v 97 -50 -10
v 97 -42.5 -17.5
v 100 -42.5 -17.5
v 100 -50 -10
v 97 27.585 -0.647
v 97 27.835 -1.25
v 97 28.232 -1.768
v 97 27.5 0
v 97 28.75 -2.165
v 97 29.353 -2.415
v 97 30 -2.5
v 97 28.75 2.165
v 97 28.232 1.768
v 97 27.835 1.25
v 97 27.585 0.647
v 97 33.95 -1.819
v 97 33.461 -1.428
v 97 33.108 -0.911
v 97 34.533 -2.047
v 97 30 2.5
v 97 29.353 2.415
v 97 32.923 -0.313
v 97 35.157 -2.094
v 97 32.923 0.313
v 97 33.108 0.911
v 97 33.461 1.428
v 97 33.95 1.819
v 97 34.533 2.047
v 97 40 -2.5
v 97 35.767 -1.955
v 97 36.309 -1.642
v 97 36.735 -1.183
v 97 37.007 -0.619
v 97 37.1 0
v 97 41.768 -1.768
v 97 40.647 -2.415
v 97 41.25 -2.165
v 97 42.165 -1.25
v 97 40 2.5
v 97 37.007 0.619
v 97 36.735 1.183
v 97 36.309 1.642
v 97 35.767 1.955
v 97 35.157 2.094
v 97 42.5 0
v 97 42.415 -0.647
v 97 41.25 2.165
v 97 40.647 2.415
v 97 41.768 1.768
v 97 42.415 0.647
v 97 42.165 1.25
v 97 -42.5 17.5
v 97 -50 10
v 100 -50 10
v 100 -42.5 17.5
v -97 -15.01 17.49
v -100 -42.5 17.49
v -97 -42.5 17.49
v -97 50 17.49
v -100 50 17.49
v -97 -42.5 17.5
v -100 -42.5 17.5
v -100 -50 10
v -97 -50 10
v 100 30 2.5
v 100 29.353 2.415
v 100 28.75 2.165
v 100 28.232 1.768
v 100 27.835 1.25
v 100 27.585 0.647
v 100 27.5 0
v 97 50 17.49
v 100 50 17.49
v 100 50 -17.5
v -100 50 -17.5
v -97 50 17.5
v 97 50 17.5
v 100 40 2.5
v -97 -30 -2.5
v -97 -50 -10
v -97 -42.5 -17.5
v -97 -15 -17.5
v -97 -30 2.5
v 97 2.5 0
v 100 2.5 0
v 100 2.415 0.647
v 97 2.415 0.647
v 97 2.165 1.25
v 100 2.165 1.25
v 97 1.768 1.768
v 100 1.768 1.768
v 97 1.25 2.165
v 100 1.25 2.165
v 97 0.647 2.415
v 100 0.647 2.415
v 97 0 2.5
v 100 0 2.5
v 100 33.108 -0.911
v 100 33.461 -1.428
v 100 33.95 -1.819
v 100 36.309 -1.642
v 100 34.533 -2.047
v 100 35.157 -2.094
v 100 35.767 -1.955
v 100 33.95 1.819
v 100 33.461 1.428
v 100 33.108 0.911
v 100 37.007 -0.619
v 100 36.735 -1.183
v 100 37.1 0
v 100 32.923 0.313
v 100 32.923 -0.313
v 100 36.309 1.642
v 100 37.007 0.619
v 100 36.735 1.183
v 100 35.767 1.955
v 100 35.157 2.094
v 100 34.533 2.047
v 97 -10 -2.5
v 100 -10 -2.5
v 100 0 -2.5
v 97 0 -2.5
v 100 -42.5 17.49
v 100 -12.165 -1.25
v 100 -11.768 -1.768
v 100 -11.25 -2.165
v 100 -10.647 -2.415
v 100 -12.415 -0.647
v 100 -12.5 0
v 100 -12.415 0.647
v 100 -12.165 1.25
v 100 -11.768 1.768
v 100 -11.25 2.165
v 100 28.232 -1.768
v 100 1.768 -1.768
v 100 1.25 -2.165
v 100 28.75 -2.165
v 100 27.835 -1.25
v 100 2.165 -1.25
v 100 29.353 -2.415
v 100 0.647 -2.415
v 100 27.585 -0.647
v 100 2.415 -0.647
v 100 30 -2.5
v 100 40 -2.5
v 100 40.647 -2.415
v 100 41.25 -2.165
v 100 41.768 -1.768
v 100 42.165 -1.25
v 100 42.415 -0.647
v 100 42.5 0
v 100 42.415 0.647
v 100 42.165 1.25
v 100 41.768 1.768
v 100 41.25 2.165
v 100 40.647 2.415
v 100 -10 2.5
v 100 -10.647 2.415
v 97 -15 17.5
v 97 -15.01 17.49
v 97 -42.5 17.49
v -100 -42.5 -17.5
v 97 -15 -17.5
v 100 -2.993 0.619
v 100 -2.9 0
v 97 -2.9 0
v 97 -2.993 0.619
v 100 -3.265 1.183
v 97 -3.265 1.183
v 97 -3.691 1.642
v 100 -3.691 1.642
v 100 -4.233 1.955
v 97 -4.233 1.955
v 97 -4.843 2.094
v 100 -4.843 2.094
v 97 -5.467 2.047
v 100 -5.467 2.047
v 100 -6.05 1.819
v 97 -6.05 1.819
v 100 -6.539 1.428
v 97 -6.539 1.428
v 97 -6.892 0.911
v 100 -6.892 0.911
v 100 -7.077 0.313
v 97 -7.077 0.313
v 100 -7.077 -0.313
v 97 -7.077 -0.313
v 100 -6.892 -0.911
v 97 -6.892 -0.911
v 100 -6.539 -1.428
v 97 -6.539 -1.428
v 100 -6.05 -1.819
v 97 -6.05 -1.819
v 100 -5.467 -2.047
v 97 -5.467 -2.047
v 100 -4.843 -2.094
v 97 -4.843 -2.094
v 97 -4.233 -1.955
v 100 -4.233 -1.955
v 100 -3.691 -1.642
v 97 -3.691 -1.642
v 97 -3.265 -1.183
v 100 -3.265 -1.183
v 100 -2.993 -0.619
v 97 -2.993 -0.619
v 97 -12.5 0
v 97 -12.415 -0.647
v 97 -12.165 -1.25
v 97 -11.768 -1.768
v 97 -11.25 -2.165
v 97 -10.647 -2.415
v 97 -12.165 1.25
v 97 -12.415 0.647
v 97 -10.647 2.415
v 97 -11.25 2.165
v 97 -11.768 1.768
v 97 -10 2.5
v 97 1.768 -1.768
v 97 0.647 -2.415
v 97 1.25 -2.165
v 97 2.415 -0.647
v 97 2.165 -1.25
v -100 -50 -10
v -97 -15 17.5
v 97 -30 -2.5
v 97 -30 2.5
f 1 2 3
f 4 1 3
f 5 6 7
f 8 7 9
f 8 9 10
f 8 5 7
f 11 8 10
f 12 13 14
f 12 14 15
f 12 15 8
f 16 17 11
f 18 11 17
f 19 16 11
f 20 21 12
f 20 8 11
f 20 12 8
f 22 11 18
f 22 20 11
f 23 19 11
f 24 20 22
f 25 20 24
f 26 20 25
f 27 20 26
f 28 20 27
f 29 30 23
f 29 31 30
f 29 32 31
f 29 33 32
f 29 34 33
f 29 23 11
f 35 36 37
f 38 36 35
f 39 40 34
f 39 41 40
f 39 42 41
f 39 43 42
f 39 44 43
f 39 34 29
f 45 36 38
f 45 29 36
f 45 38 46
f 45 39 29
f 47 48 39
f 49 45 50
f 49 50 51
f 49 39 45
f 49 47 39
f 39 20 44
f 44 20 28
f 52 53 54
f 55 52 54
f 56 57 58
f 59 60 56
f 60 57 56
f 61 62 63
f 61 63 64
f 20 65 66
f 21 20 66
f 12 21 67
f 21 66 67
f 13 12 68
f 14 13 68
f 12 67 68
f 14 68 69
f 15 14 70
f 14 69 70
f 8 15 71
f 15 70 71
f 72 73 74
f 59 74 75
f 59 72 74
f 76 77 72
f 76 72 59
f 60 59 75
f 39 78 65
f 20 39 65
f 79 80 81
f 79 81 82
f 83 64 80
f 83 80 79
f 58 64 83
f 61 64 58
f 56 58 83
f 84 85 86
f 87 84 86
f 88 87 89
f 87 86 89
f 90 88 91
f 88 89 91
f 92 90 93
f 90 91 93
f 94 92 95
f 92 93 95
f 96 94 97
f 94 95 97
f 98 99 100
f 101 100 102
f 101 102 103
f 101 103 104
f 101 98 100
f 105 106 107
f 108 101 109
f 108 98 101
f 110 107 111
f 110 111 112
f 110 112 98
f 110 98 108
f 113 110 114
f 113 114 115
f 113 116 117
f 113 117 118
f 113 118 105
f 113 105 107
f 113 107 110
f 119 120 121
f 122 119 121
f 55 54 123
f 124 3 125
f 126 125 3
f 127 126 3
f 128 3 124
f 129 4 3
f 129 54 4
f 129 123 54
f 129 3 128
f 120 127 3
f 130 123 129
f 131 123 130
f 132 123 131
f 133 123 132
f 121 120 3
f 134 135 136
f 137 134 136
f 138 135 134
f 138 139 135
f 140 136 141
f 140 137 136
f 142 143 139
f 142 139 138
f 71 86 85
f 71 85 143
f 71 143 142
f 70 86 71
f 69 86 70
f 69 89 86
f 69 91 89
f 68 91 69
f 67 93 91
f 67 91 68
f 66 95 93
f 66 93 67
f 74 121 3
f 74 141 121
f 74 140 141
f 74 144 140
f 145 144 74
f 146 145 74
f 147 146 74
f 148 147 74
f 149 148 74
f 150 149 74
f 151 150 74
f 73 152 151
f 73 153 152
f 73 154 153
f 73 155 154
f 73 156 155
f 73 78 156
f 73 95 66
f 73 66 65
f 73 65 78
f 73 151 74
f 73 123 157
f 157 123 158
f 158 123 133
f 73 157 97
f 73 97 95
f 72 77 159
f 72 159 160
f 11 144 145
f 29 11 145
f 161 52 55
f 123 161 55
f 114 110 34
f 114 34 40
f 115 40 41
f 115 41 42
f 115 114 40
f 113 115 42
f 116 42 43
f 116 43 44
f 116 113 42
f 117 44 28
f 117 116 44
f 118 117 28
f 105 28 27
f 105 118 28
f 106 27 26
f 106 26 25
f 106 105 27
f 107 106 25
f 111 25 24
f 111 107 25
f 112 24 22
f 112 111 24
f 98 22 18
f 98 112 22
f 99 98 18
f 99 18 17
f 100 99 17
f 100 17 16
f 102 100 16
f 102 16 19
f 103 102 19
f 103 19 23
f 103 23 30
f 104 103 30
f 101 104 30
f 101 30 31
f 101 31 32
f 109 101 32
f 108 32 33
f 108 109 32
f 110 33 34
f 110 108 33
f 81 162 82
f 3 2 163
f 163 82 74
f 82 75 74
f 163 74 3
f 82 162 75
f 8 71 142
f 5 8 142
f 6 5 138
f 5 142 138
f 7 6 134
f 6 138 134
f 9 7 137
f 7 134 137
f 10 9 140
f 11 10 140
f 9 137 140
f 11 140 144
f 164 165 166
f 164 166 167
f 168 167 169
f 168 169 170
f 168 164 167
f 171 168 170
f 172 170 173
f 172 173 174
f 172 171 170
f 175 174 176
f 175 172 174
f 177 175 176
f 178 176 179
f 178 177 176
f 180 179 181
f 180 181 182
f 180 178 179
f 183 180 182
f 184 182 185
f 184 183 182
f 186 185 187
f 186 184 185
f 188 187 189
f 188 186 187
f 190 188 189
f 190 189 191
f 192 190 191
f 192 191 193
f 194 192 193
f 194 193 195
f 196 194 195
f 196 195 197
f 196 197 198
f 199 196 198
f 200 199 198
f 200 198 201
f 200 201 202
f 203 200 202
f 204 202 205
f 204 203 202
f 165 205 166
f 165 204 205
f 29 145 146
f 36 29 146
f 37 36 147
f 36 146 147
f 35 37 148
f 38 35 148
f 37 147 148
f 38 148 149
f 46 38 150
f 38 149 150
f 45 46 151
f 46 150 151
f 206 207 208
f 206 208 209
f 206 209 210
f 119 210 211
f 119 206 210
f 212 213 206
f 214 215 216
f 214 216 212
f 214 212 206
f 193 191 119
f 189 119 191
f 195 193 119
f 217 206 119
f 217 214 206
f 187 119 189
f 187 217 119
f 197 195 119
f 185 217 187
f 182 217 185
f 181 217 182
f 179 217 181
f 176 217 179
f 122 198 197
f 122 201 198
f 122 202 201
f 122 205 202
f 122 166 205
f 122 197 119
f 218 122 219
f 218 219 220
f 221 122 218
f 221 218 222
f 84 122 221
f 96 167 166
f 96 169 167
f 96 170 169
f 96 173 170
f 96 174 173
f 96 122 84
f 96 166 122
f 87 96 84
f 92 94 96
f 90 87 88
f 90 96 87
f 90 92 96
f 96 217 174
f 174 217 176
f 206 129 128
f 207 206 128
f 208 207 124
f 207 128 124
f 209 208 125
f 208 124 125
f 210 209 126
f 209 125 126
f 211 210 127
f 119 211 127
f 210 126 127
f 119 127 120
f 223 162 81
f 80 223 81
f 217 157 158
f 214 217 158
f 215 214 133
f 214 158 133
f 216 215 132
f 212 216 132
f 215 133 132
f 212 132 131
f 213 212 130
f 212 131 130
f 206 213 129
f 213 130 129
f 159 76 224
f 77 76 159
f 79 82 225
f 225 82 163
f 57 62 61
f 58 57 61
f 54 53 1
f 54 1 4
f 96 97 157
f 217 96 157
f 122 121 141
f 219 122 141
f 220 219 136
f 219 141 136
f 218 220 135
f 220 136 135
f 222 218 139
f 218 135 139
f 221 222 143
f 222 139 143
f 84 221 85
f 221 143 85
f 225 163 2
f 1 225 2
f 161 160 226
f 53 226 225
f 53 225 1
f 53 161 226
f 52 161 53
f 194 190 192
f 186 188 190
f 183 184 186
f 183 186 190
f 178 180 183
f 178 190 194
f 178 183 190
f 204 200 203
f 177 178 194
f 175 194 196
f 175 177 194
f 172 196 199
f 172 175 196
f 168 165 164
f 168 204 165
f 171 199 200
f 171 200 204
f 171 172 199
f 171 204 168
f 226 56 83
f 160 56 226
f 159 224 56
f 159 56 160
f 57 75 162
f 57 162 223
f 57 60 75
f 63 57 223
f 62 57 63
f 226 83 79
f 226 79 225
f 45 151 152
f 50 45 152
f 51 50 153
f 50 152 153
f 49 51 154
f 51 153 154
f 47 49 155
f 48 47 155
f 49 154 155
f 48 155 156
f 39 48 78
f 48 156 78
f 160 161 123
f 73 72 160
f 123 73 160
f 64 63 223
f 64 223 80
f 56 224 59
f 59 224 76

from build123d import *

# Parameters (mm, degrees)
F1_DEPTH      = 17.5
F1_DEPTH_BACK = 17.5
F2_SIZE       = 15
F3_SIZE       = 7.5
F4_R          = 2.1
F5_DEPTH      = 3
F7_DEPTH      = 0.01


with BuildPart() as f1:
    # F0 (on Top) → F1 (new body, two sides)
    with BuildSketch(Plane.XY) as f1_sk:
        Polygon((100, -50), (100, 50), (-100, 50), (-100, -50), (-97, -50), (-97, -30), (97, -30), (97, -50), align=None)
    extrude(amount=F1_DEPTH)
    extrude(f1_sk.sketch, amount=-F1_DEPTH_BACK)

    # F2
    f2_edges = [f1.edges().sort_by_distance(p)[0] for p in [
        (0, -30, 17.5),
        (0, -30, -17.5),
    ]]
    chamfer(f2_edges, length=F2_SIZE)

    # F3
    f3_edges = [f1.edges().sort_by_distance(p)[0] for p in [
        (98.5, -50, 17.5),
        (98.5, -50, -17.5),
        (-98.5, -50, 17.5),
        (-98.5, -50, -17.5),
    ]]
    chamfer(f3_edges, length=F3_SIZE)

    # F4 (on face) → F5 (cut)
    with BuildSketch(Plane.YZ.offset(100)):
        with BuildLine():
            ThreePointArc((42.5, 0), (41.767767, 1.767767), (40, 2.5))
            Line((40, 2.5), (30, 2.5))
            ThreePointArc((30, 2.5), (28.232233, 1.767767), (27.5, 0))
            ThreePointArc((27.5, 0), (28.232233, -1.767767), (30, -2.5))
            Line((30, -2.5), (40, -2.5))
            ThreePointArc((40, -2.5), (41.767767, -1.767767), (42.5, 0))
        make_face()
        with Locations((35, 0)):
            Circle(F4_R, mode=Mode.SUBTRACT)
        with BuildLine():
            ThreePointArc((2.5, 0), (1.767767, 1.767767), (0, 2.5))
            Line((0, 2.5), (-10, 2.5))
            ThreePointArc((-10, 2.5), (-11.767767, 1.767767), (-12.5, 0))
            ThreePointArc((-12.5, 0), (-11.767767, -1.767767), (-10, -2.5))
            Line((-10, -2.5), (0, -2.5))
            ThreePointArc((0, -2.5), (1.767767, -1.767767), (2.5, 0))
        make_face()
        with Locations((-5, 0)):
            Circle(F4_R, mode=Mode.SUBTRACT)
    extrude(amount=-F5_DEPTH, mode=Mode.SUBTRACT)

    # F6 (on face) → F7 (cut)
    with BuildSketch(Plane.XY.offset(17.5)):
        Polygon((100, 50), (97, 50), (97, -15), (97, -42.5), (100, -42.5), align=None)
        Polygon((-97, 50), (-100, 50), (-100, -42.5), (-97, -42.5), (-97, -15), align=None)
    extrude(amount=-F7_DEPTH, mode=Mode.SUBTRACT)


solid = f1.part
